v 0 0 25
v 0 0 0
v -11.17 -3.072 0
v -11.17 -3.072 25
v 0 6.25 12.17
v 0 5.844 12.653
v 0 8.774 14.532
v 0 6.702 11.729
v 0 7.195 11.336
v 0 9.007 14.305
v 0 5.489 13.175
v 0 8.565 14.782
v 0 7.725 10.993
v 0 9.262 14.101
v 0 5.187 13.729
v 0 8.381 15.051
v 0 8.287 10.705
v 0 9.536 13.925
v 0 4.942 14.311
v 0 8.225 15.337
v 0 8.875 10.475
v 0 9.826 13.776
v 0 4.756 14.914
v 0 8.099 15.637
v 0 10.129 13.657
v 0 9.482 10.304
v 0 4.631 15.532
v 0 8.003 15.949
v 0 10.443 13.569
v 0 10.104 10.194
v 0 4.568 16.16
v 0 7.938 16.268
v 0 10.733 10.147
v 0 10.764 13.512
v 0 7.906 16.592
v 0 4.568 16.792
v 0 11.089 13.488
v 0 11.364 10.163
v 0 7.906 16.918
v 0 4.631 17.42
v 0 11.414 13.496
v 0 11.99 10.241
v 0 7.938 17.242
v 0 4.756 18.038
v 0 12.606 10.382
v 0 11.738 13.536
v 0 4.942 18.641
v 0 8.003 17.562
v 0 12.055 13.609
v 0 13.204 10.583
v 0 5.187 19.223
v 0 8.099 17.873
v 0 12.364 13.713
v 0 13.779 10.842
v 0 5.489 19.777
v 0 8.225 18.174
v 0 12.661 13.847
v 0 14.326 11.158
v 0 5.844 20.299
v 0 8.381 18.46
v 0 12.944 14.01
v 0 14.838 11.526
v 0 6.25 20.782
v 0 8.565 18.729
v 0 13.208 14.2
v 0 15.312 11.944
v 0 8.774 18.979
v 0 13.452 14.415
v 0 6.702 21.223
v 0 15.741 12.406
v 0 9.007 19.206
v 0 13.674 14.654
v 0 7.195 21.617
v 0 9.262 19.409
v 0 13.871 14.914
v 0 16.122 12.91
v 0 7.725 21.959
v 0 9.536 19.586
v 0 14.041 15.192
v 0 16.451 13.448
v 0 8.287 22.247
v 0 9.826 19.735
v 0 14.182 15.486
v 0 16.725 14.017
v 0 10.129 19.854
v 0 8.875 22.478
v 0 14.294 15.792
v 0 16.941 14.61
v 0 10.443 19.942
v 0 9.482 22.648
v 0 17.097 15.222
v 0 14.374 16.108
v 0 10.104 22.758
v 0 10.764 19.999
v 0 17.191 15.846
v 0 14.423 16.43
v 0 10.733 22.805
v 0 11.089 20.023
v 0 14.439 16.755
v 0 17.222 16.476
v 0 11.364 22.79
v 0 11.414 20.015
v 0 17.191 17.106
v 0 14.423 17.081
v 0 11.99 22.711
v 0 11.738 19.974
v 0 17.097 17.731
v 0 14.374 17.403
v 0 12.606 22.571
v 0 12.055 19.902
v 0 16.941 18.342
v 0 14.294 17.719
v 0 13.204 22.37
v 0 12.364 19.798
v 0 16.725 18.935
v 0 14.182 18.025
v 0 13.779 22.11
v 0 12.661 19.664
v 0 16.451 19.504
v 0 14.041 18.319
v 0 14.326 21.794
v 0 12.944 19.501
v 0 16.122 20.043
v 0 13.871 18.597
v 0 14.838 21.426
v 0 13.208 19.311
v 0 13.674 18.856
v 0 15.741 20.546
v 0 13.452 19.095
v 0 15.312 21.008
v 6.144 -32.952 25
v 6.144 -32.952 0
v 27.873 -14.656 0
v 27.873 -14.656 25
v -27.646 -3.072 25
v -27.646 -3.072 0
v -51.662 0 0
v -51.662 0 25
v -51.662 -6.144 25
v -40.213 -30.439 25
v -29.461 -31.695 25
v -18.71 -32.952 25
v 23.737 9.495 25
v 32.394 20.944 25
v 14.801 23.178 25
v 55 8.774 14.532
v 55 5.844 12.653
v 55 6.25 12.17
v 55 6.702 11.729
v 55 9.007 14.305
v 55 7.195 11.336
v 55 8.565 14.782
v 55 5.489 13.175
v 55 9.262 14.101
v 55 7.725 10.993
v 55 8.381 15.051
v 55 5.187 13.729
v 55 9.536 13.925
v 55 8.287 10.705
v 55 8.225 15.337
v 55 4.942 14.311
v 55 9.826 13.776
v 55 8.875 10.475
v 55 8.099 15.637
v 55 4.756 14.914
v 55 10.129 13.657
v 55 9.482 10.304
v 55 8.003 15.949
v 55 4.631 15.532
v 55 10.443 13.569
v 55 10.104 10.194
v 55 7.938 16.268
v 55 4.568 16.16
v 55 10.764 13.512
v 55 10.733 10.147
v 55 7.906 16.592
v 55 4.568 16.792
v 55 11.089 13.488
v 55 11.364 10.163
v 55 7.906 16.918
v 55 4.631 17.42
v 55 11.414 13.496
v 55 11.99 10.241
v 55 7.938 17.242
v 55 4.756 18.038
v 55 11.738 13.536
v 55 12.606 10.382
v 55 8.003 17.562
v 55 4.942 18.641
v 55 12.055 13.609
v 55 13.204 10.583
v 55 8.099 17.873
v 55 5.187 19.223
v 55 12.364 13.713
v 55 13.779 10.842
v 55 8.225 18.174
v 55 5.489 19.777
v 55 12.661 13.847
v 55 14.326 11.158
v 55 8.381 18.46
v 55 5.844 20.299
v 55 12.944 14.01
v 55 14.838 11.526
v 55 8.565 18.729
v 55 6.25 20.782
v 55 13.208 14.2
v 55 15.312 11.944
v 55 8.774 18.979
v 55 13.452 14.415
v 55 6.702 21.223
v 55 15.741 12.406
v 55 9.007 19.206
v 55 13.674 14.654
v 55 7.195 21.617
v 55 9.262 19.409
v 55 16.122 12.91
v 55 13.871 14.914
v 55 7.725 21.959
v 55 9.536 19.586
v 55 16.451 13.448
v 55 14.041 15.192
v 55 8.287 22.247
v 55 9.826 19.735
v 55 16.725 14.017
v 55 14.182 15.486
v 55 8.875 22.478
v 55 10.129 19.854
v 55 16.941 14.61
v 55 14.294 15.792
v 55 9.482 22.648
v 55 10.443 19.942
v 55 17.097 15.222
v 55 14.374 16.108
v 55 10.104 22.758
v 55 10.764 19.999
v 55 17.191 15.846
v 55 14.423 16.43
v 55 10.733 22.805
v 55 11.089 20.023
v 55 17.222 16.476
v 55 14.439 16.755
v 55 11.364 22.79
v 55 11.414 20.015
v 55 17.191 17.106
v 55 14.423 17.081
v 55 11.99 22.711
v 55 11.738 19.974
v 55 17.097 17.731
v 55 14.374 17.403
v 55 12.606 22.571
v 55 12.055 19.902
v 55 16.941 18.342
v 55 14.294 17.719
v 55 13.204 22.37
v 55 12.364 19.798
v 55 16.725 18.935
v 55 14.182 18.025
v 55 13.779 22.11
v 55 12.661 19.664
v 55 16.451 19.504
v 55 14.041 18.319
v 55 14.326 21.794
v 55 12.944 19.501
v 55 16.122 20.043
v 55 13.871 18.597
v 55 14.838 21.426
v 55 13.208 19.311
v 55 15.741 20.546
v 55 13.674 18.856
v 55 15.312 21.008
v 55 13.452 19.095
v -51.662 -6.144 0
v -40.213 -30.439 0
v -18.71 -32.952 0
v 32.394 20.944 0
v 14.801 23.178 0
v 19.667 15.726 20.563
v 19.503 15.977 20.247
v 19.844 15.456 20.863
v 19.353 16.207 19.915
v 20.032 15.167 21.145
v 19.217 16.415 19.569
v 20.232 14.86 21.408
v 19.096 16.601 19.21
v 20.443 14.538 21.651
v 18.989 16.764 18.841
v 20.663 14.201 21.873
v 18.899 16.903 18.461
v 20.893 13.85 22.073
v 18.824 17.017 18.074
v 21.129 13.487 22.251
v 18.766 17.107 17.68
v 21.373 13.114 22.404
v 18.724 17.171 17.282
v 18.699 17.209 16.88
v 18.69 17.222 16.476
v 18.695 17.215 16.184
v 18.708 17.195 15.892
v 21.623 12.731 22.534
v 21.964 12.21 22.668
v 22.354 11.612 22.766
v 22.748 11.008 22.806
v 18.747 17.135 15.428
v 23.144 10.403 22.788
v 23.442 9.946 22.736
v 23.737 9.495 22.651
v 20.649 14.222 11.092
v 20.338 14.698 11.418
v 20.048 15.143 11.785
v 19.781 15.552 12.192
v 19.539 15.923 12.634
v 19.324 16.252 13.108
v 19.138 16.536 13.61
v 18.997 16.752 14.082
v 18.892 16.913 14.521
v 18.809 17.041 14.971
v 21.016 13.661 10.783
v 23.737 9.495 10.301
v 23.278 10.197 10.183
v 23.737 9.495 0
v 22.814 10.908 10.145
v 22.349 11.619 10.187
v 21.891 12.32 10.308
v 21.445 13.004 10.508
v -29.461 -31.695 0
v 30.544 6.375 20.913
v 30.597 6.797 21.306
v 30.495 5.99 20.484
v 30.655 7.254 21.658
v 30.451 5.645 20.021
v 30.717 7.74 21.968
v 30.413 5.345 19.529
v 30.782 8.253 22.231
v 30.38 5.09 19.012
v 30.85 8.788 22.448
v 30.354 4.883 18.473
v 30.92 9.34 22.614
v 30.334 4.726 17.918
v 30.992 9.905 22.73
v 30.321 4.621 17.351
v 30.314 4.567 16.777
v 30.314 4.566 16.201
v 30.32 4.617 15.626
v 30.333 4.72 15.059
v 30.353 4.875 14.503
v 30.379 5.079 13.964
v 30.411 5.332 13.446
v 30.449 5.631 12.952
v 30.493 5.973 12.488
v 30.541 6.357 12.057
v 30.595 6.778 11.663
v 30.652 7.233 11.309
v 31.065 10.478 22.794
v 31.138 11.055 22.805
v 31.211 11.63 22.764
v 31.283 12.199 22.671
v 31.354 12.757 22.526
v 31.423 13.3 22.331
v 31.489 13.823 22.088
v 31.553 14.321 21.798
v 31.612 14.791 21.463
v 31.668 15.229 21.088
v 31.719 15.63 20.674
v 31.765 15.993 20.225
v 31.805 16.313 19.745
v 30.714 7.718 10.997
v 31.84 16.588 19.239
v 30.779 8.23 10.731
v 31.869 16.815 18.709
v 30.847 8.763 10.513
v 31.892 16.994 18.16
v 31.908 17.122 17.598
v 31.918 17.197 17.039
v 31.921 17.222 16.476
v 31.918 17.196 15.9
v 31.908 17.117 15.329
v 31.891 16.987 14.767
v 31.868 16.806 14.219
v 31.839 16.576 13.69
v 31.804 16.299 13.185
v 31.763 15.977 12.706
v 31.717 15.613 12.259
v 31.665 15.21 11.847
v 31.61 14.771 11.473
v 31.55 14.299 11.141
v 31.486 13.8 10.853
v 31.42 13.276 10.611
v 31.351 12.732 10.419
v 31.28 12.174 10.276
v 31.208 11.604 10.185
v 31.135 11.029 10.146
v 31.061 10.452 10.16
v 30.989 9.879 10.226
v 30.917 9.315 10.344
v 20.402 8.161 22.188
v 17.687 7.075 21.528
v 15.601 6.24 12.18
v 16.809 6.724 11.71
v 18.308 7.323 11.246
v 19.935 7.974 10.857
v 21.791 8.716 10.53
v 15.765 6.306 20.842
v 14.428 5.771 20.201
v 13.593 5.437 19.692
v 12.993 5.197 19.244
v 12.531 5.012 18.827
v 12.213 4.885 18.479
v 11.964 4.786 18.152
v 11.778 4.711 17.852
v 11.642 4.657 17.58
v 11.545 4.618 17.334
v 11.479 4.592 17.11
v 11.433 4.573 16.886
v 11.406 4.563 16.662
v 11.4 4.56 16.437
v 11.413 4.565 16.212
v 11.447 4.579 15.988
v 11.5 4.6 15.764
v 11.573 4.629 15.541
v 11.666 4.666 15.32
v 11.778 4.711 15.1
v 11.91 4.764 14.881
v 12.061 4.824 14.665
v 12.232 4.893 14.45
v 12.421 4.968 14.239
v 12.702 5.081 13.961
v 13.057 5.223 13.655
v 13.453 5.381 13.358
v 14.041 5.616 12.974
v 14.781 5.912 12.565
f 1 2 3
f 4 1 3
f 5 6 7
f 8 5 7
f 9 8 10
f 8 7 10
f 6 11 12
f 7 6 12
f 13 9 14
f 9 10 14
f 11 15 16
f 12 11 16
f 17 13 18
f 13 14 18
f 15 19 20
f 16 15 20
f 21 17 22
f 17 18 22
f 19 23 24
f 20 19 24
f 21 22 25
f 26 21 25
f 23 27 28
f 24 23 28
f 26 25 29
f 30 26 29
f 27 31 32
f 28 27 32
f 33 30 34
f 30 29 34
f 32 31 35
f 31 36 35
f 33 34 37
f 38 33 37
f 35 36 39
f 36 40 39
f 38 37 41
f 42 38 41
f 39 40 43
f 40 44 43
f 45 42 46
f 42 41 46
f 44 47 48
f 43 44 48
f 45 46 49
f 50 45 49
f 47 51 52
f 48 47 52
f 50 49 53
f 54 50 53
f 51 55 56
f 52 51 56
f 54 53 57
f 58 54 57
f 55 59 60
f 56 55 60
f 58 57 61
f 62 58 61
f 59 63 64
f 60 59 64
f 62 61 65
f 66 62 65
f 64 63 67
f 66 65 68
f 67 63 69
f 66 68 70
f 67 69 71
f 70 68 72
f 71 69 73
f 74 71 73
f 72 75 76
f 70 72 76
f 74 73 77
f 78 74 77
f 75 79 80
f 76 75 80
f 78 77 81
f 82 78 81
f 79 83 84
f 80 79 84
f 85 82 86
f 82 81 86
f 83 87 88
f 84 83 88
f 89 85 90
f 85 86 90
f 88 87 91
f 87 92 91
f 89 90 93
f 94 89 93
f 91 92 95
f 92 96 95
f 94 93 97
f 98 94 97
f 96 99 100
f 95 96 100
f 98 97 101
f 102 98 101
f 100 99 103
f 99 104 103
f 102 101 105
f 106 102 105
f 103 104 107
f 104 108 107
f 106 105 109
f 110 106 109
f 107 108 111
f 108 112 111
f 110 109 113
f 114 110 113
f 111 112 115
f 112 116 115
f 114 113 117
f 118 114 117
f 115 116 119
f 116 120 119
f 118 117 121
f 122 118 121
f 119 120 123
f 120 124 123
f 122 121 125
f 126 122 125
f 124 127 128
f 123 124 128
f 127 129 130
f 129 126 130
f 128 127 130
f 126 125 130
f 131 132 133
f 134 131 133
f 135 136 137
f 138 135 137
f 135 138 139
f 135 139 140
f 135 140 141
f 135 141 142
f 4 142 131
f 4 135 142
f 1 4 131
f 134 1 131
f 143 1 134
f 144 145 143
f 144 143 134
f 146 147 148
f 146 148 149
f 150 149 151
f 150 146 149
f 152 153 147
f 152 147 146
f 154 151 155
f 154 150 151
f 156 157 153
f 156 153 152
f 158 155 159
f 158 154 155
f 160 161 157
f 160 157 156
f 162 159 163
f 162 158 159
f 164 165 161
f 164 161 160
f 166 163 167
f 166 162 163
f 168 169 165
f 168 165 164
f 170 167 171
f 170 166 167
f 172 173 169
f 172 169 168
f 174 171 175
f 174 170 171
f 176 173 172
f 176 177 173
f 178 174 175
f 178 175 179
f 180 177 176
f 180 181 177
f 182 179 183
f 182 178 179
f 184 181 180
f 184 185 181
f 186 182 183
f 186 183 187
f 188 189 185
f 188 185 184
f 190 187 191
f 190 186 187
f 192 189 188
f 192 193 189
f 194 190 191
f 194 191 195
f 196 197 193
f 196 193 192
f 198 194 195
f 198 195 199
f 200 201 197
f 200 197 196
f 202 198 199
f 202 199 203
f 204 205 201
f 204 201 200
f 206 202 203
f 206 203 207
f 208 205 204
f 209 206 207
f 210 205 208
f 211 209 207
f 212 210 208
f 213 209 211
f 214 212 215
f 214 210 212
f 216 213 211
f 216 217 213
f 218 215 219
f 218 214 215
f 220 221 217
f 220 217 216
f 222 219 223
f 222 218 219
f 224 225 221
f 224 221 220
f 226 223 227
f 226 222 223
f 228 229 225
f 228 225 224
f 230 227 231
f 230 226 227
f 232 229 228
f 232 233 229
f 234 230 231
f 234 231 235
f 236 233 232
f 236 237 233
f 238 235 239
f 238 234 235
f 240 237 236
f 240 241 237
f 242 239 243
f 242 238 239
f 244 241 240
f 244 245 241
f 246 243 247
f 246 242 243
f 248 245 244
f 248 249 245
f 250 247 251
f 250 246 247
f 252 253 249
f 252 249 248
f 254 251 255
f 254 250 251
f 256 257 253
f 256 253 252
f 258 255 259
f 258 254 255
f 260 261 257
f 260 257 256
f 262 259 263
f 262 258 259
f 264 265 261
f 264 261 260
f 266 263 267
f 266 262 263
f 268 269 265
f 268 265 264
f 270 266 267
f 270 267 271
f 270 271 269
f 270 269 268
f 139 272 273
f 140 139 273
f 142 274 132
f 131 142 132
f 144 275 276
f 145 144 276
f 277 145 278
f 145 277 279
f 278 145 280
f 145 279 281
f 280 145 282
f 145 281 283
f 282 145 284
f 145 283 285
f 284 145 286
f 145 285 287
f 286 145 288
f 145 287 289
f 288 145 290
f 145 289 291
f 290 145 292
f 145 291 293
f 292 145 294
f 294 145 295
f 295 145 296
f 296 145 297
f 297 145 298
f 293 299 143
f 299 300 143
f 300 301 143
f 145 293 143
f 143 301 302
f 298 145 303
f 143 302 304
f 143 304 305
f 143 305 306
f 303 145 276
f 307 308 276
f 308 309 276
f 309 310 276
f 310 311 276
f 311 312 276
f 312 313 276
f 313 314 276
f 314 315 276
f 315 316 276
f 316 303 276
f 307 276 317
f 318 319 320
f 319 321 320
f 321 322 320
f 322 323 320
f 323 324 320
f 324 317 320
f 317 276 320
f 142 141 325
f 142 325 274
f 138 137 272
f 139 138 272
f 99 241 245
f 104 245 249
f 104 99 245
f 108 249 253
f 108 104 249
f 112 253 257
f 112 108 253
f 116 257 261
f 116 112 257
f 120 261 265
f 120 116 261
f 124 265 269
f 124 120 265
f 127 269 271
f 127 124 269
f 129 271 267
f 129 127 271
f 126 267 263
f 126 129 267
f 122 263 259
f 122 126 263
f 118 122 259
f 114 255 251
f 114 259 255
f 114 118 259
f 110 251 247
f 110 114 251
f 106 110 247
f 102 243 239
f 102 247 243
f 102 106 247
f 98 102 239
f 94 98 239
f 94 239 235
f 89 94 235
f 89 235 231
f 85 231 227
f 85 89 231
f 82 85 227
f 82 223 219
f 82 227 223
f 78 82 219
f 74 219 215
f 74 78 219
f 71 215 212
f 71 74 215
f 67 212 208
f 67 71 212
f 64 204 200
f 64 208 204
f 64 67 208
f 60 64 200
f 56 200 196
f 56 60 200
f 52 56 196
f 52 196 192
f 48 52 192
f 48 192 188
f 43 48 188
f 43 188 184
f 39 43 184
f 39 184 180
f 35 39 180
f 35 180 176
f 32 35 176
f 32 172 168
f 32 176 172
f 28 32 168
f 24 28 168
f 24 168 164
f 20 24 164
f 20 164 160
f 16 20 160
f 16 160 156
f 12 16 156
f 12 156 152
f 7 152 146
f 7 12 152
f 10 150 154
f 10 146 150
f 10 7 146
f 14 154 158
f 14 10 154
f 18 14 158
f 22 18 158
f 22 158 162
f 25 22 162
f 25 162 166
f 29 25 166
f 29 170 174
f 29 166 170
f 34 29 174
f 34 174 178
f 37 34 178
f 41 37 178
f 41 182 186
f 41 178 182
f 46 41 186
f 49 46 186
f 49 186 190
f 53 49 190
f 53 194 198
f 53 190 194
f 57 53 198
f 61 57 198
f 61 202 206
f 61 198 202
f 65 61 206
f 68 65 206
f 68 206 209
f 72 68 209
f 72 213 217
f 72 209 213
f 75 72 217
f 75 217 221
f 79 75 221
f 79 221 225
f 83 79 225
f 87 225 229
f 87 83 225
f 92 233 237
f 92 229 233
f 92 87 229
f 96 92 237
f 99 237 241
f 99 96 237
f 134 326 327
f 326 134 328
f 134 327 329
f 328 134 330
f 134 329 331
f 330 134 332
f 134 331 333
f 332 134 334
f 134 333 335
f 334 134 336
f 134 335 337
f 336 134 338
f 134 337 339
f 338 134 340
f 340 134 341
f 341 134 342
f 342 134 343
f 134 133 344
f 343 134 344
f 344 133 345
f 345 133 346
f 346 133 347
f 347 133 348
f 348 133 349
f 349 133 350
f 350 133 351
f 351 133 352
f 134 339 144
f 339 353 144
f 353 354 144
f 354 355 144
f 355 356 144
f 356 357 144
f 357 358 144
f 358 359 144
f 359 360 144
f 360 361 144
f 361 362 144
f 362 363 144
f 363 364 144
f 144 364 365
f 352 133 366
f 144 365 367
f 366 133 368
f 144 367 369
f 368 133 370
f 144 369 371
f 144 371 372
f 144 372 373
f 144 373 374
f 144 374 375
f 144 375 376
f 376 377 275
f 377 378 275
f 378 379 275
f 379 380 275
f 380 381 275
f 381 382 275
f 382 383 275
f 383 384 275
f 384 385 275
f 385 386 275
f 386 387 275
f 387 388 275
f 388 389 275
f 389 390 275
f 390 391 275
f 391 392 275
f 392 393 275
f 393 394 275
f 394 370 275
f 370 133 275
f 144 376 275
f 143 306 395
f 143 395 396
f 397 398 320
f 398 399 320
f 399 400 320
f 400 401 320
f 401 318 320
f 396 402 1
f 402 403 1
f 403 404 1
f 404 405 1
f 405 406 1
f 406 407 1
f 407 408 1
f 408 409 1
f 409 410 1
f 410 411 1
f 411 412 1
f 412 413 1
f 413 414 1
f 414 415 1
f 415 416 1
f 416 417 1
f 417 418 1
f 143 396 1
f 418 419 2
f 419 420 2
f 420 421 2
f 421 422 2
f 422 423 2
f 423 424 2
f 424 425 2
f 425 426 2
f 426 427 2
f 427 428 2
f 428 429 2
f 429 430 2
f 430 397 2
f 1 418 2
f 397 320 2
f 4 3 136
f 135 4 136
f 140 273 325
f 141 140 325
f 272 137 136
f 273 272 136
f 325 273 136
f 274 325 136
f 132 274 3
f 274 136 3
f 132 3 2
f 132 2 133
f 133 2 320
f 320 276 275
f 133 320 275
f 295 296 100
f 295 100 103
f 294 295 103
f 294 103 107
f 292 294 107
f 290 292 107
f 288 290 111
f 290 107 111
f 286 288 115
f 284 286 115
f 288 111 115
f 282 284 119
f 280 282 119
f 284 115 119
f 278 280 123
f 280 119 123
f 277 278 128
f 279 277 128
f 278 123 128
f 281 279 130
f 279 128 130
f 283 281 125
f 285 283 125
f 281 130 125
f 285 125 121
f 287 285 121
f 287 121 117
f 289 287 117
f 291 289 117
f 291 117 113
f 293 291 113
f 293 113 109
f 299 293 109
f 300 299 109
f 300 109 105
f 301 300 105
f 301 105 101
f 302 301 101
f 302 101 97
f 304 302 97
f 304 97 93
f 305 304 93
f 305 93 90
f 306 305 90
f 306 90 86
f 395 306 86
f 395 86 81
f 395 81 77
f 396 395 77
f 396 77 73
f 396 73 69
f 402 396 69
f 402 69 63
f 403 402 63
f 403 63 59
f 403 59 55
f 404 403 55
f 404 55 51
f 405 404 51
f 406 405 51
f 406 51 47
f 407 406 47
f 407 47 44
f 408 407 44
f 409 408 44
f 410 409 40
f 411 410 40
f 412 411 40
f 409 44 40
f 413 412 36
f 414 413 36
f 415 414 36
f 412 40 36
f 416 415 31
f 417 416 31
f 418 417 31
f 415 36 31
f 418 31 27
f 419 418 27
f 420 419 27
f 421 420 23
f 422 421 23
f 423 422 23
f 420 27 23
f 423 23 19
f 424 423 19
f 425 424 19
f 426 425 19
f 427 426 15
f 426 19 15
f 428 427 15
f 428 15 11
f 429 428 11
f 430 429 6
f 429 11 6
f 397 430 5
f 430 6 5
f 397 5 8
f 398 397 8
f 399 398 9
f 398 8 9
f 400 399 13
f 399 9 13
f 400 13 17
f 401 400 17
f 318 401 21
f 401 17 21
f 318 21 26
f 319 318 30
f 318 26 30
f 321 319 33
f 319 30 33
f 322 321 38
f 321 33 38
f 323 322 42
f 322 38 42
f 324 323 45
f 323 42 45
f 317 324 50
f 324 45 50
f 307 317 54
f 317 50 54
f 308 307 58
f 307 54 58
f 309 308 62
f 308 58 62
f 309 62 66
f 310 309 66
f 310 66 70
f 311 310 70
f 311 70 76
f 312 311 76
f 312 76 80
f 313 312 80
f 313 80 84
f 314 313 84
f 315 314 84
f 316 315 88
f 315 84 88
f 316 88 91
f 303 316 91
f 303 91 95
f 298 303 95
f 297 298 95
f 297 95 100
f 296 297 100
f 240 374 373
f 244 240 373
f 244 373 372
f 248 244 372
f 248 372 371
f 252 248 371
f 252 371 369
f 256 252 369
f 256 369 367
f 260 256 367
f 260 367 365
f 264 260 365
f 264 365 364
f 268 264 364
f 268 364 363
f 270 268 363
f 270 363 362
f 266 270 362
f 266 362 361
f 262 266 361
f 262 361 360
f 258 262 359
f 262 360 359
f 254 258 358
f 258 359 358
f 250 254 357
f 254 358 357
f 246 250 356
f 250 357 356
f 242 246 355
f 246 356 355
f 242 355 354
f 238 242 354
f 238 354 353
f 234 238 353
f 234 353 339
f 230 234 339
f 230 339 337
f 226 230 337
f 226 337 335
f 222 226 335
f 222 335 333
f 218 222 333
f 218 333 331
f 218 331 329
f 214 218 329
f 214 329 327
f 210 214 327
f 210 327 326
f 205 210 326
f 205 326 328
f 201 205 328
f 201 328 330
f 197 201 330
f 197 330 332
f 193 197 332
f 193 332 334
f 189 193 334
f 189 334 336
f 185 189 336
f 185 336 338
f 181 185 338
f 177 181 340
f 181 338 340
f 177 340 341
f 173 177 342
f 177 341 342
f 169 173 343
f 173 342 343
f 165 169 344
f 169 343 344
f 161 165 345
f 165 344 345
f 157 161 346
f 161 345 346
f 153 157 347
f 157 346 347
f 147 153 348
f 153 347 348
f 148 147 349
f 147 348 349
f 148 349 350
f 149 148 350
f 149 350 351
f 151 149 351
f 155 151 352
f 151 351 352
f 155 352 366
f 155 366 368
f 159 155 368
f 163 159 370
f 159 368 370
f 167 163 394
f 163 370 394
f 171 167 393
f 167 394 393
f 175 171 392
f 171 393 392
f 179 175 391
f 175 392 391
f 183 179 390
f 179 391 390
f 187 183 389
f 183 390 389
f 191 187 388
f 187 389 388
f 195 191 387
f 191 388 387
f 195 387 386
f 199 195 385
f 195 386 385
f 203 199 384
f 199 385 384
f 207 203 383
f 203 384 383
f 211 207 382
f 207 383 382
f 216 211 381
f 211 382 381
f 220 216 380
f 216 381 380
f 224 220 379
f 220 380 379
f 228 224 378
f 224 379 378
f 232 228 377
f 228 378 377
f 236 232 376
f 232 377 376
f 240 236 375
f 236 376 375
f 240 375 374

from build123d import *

# Parameters (mm, degrees)
F1_DEPTH = 25
F2_R     = 6.331158
F3_DEPTH = 55
F4_R     = 4.545947
F5_DEPTH = 51.663236
F6_R     = 3.2686
F7_DEPTH = 55.001


with BuildPart() as f1:
    # F0 (on Top) → F1 (new body)
    with BuildSketch(Plane.XY):
        Polygon((23.736702, 9.494681), (0, 0), (-11.170213, -3.071809), (-27.646277, -3.071809), (-51.662236, 0), (-51.662236, -6.143617), (-40.212769, -30.438831), (-29.461436, -31.695481), (-18.710107, -32.95213), (6.143617, -32.95213), (27.872912, -14.656438), (32.393619, 20.94415), (14.800533, 23.178192), align=None)
    extrude(amount=F1_DEPTH)

    # F2 (on Right) → F3 (join)
    with BuildSketch(Plane.YZ):
        with Locations((10.890958, 16.476065)):
            Circle(F2_R)
    extrude(amount=F3_DEPTH)

    # F4 (on Right) → F5 (cut, through all)
    with BuildSketch(Plane.YZ):
        with Locations((10.890957, 16.75532)):
            Circle(F4_R)
    extrude(amount=-F5_DEPTH, mode=Mode.SUBTRACT)

    # F6 (on Right) → F7 (cut, through all)
    with BuildSketch(Plane.YZ):
        with Locations((11.170213, 16.75532)):
            Circle(F6_R)
    extrude(amount=F7_DEPTH, mode=Mode.SUBTRACT)


solid = f1.part
